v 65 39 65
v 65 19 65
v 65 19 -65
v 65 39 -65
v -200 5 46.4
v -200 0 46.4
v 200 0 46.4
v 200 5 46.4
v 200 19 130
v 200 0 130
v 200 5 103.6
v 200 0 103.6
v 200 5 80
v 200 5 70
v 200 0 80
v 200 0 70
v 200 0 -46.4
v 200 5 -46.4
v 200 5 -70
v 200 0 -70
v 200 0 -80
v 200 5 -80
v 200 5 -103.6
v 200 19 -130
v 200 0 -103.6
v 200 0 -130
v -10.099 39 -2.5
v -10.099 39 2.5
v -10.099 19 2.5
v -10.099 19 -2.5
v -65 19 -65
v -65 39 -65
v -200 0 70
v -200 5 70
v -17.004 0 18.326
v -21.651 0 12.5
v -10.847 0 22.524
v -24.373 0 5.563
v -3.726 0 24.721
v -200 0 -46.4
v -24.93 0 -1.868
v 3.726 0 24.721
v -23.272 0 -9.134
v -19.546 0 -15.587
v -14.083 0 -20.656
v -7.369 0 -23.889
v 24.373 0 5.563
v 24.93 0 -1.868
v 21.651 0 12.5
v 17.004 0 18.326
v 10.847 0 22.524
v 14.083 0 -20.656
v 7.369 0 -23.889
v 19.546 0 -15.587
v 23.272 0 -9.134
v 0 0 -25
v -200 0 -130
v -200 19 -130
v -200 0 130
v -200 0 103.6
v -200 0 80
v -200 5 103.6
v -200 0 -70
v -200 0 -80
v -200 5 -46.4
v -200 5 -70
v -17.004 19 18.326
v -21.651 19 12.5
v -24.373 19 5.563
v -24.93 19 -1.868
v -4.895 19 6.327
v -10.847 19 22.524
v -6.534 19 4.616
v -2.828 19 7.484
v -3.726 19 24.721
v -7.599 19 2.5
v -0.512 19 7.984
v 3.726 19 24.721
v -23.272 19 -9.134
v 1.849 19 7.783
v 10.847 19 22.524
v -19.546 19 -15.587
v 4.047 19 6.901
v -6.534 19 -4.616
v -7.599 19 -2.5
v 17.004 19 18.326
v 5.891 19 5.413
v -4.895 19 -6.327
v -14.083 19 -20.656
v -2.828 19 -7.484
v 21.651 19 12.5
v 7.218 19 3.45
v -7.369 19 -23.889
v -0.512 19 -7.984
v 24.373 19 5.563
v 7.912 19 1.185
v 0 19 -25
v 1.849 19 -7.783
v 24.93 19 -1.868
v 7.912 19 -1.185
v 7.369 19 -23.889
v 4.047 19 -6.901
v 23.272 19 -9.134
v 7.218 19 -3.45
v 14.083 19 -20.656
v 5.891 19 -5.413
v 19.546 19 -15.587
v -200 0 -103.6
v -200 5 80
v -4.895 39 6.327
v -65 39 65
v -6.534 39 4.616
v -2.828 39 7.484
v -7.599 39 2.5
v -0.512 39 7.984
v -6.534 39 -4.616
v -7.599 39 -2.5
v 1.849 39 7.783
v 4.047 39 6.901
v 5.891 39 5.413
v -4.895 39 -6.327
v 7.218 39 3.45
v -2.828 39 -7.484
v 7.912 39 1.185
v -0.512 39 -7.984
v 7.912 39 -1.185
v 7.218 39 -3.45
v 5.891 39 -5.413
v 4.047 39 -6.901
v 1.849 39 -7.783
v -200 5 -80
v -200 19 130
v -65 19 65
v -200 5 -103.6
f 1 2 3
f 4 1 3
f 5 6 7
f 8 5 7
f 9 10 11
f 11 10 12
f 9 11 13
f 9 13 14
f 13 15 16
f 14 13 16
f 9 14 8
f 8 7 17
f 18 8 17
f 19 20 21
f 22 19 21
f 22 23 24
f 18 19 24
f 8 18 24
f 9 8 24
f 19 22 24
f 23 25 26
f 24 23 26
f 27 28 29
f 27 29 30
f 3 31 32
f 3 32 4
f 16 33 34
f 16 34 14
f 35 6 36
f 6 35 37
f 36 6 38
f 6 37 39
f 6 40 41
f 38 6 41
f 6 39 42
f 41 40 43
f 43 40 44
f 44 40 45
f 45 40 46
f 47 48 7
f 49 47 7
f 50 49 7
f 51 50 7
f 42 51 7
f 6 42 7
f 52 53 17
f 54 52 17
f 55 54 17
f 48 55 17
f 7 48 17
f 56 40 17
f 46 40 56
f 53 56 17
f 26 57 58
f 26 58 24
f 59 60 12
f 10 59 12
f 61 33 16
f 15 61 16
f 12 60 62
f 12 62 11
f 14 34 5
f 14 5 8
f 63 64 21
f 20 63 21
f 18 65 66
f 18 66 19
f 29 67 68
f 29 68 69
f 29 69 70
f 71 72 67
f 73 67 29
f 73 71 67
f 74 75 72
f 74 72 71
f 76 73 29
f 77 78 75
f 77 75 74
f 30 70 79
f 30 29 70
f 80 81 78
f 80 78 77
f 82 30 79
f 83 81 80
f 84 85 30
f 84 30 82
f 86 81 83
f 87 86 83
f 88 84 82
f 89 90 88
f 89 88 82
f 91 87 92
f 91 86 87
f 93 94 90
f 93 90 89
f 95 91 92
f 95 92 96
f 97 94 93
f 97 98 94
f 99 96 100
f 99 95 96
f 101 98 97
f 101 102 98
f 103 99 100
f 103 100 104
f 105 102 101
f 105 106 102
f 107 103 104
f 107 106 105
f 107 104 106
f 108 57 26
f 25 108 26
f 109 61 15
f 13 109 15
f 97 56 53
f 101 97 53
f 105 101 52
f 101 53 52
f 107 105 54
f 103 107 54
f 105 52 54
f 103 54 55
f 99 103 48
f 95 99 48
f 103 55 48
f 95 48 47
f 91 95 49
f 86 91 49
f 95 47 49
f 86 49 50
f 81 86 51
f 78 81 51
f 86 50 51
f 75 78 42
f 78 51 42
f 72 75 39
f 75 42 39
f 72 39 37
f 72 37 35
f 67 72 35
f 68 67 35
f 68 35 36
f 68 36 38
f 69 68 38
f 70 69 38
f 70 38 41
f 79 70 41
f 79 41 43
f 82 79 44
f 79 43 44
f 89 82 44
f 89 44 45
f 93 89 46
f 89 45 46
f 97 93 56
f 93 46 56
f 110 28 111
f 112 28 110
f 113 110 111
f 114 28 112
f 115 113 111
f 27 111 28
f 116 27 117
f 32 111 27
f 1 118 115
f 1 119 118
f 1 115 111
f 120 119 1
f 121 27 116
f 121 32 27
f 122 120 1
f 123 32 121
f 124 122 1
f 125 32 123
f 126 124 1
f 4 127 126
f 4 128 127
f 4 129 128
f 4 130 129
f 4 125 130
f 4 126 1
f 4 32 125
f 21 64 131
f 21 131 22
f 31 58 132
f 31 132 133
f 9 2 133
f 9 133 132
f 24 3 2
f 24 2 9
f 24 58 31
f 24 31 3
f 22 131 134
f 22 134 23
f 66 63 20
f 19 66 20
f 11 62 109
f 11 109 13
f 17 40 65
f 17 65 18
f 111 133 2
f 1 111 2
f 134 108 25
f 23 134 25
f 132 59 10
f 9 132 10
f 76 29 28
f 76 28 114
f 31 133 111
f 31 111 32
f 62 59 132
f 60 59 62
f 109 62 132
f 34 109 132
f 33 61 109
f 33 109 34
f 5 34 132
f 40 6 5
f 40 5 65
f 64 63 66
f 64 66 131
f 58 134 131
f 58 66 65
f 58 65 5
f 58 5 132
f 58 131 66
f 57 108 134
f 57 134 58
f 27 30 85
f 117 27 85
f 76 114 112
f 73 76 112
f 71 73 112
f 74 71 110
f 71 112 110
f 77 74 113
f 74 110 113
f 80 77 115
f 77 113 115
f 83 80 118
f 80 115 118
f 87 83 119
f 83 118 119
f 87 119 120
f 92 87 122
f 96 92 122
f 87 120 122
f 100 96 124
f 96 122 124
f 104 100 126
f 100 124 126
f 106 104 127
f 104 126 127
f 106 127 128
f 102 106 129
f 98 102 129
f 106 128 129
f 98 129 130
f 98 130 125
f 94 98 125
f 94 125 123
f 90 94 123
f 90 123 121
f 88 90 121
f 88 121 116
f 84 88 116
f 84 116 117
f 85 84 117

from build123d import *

# Parameters (mm, degrees)
SKETCH1_W           = 400
SKETCH1_H           = 260
BOSS_EXTRUDE1_DEPTH = 19
SKETCH2_W           = 400
SKETCH2_H           = 23.6
CUT_EXTRUDE1_DEPTH  = 5
SKETCH4_W           = 130
SKETCH4_H           = 130
BOSS_EXTRUDE4_DEPTH = 20
SKETCH5_R           = 8
CUT_EXTRUDE2_DEPTH  = 242.704364876
SKETCH6_W           = 2.5
SKETCH6_H           = 5
CUT_EXTRUDE4_DEPTH  = 242.704364876
SKETCH7_R           = 25
CUT_EXTRUDE5_DEPTH  = 19


with BuildPart() as part:
    # Sketch1 → Boss-Extrude1 (new body)
    with BuildSketch(Plane(origin=(0, 0, 0), x_dir=(1, 0, 0), z_dir=(0, 1, 0))):
        Rectangle(SKETCH1_W, SKETCH1_H)
    extrude(amount=BOSS_EXTRUDE1_DEPTH)

    # Sketch2 → Cut-Extrude1 (cut)
    with BuildSketch(Plane.XZ):
        with Locations((0, 91.8)):
            Rectangle(SKETCH2_W, SKETCH2_H)
        with Locations((0, 58.2)):
            Rectangle(SKETCH2_W, SKETCH2_H)
        with Locations((0, -58.2)):
            Rectangle(SKETCH2_W, SKETCH2_H)
        with Locations((0, -91.8)):
            Rectangle(SKETCH2_W, SKETCH2_H)
    extrude(amount=-CUT_EXTRUDE1_DEPTH, mode=Mode.SUBTRACT)

    # Sketch4 → Boss-Extrude4 (add)
    with BuildSketch(Plane(origin=(0, 19, 0), x_dir=(1, 0, 0), z_dir=(0, 1, 0))):
        Rectangle(SKETCH4_W, SKETCH4_H)
    extrude(amount=BOSS_EXTRUDE4_DEPTH)

    # Sketch5 → Cut-Extrude2 (cut, through all)
    with BuildSketch(Plane(origin=(0, 39, 0), x_dir=(1, 0, 0), z_dir=(0, 1, 0))):
        with Locations(Location((0, 0, 0), (0, 0, 270))):
            Circle(SKETCH5_R)
    extrude(amount=-CUT_EXTRUDE2_DEPTH, mode=Mode.SUBTRACT)

    # Sketch6 → Cut-Extrude4 (cut, through all)
    with BuildSketch(Plane(origin=(0, 39, 0), x_dir=(1, 0, 0), z_dir=(0, 1, 0))):
        with Locations((-8.849342077, 0)):
            Rectangle(SKETCH6_W, SKETCH6_H)
    extrude(amount=-CUT_EXTRUDE4_DEPTH, mode=Mode.SUBTRACT)

    # Sketch7 → Cut-Extrude5 (cut)
    with BuildSketch(Plane.XZ):
        with Locations(Location((0, 0, 0), (0, 0, 270))):
            Circle(SKETCH7_R)
    extrude(amount=-CUT_EXTRUDE5_DEPTH, mode=Mode.SUBTRACT)


solid = part.part
